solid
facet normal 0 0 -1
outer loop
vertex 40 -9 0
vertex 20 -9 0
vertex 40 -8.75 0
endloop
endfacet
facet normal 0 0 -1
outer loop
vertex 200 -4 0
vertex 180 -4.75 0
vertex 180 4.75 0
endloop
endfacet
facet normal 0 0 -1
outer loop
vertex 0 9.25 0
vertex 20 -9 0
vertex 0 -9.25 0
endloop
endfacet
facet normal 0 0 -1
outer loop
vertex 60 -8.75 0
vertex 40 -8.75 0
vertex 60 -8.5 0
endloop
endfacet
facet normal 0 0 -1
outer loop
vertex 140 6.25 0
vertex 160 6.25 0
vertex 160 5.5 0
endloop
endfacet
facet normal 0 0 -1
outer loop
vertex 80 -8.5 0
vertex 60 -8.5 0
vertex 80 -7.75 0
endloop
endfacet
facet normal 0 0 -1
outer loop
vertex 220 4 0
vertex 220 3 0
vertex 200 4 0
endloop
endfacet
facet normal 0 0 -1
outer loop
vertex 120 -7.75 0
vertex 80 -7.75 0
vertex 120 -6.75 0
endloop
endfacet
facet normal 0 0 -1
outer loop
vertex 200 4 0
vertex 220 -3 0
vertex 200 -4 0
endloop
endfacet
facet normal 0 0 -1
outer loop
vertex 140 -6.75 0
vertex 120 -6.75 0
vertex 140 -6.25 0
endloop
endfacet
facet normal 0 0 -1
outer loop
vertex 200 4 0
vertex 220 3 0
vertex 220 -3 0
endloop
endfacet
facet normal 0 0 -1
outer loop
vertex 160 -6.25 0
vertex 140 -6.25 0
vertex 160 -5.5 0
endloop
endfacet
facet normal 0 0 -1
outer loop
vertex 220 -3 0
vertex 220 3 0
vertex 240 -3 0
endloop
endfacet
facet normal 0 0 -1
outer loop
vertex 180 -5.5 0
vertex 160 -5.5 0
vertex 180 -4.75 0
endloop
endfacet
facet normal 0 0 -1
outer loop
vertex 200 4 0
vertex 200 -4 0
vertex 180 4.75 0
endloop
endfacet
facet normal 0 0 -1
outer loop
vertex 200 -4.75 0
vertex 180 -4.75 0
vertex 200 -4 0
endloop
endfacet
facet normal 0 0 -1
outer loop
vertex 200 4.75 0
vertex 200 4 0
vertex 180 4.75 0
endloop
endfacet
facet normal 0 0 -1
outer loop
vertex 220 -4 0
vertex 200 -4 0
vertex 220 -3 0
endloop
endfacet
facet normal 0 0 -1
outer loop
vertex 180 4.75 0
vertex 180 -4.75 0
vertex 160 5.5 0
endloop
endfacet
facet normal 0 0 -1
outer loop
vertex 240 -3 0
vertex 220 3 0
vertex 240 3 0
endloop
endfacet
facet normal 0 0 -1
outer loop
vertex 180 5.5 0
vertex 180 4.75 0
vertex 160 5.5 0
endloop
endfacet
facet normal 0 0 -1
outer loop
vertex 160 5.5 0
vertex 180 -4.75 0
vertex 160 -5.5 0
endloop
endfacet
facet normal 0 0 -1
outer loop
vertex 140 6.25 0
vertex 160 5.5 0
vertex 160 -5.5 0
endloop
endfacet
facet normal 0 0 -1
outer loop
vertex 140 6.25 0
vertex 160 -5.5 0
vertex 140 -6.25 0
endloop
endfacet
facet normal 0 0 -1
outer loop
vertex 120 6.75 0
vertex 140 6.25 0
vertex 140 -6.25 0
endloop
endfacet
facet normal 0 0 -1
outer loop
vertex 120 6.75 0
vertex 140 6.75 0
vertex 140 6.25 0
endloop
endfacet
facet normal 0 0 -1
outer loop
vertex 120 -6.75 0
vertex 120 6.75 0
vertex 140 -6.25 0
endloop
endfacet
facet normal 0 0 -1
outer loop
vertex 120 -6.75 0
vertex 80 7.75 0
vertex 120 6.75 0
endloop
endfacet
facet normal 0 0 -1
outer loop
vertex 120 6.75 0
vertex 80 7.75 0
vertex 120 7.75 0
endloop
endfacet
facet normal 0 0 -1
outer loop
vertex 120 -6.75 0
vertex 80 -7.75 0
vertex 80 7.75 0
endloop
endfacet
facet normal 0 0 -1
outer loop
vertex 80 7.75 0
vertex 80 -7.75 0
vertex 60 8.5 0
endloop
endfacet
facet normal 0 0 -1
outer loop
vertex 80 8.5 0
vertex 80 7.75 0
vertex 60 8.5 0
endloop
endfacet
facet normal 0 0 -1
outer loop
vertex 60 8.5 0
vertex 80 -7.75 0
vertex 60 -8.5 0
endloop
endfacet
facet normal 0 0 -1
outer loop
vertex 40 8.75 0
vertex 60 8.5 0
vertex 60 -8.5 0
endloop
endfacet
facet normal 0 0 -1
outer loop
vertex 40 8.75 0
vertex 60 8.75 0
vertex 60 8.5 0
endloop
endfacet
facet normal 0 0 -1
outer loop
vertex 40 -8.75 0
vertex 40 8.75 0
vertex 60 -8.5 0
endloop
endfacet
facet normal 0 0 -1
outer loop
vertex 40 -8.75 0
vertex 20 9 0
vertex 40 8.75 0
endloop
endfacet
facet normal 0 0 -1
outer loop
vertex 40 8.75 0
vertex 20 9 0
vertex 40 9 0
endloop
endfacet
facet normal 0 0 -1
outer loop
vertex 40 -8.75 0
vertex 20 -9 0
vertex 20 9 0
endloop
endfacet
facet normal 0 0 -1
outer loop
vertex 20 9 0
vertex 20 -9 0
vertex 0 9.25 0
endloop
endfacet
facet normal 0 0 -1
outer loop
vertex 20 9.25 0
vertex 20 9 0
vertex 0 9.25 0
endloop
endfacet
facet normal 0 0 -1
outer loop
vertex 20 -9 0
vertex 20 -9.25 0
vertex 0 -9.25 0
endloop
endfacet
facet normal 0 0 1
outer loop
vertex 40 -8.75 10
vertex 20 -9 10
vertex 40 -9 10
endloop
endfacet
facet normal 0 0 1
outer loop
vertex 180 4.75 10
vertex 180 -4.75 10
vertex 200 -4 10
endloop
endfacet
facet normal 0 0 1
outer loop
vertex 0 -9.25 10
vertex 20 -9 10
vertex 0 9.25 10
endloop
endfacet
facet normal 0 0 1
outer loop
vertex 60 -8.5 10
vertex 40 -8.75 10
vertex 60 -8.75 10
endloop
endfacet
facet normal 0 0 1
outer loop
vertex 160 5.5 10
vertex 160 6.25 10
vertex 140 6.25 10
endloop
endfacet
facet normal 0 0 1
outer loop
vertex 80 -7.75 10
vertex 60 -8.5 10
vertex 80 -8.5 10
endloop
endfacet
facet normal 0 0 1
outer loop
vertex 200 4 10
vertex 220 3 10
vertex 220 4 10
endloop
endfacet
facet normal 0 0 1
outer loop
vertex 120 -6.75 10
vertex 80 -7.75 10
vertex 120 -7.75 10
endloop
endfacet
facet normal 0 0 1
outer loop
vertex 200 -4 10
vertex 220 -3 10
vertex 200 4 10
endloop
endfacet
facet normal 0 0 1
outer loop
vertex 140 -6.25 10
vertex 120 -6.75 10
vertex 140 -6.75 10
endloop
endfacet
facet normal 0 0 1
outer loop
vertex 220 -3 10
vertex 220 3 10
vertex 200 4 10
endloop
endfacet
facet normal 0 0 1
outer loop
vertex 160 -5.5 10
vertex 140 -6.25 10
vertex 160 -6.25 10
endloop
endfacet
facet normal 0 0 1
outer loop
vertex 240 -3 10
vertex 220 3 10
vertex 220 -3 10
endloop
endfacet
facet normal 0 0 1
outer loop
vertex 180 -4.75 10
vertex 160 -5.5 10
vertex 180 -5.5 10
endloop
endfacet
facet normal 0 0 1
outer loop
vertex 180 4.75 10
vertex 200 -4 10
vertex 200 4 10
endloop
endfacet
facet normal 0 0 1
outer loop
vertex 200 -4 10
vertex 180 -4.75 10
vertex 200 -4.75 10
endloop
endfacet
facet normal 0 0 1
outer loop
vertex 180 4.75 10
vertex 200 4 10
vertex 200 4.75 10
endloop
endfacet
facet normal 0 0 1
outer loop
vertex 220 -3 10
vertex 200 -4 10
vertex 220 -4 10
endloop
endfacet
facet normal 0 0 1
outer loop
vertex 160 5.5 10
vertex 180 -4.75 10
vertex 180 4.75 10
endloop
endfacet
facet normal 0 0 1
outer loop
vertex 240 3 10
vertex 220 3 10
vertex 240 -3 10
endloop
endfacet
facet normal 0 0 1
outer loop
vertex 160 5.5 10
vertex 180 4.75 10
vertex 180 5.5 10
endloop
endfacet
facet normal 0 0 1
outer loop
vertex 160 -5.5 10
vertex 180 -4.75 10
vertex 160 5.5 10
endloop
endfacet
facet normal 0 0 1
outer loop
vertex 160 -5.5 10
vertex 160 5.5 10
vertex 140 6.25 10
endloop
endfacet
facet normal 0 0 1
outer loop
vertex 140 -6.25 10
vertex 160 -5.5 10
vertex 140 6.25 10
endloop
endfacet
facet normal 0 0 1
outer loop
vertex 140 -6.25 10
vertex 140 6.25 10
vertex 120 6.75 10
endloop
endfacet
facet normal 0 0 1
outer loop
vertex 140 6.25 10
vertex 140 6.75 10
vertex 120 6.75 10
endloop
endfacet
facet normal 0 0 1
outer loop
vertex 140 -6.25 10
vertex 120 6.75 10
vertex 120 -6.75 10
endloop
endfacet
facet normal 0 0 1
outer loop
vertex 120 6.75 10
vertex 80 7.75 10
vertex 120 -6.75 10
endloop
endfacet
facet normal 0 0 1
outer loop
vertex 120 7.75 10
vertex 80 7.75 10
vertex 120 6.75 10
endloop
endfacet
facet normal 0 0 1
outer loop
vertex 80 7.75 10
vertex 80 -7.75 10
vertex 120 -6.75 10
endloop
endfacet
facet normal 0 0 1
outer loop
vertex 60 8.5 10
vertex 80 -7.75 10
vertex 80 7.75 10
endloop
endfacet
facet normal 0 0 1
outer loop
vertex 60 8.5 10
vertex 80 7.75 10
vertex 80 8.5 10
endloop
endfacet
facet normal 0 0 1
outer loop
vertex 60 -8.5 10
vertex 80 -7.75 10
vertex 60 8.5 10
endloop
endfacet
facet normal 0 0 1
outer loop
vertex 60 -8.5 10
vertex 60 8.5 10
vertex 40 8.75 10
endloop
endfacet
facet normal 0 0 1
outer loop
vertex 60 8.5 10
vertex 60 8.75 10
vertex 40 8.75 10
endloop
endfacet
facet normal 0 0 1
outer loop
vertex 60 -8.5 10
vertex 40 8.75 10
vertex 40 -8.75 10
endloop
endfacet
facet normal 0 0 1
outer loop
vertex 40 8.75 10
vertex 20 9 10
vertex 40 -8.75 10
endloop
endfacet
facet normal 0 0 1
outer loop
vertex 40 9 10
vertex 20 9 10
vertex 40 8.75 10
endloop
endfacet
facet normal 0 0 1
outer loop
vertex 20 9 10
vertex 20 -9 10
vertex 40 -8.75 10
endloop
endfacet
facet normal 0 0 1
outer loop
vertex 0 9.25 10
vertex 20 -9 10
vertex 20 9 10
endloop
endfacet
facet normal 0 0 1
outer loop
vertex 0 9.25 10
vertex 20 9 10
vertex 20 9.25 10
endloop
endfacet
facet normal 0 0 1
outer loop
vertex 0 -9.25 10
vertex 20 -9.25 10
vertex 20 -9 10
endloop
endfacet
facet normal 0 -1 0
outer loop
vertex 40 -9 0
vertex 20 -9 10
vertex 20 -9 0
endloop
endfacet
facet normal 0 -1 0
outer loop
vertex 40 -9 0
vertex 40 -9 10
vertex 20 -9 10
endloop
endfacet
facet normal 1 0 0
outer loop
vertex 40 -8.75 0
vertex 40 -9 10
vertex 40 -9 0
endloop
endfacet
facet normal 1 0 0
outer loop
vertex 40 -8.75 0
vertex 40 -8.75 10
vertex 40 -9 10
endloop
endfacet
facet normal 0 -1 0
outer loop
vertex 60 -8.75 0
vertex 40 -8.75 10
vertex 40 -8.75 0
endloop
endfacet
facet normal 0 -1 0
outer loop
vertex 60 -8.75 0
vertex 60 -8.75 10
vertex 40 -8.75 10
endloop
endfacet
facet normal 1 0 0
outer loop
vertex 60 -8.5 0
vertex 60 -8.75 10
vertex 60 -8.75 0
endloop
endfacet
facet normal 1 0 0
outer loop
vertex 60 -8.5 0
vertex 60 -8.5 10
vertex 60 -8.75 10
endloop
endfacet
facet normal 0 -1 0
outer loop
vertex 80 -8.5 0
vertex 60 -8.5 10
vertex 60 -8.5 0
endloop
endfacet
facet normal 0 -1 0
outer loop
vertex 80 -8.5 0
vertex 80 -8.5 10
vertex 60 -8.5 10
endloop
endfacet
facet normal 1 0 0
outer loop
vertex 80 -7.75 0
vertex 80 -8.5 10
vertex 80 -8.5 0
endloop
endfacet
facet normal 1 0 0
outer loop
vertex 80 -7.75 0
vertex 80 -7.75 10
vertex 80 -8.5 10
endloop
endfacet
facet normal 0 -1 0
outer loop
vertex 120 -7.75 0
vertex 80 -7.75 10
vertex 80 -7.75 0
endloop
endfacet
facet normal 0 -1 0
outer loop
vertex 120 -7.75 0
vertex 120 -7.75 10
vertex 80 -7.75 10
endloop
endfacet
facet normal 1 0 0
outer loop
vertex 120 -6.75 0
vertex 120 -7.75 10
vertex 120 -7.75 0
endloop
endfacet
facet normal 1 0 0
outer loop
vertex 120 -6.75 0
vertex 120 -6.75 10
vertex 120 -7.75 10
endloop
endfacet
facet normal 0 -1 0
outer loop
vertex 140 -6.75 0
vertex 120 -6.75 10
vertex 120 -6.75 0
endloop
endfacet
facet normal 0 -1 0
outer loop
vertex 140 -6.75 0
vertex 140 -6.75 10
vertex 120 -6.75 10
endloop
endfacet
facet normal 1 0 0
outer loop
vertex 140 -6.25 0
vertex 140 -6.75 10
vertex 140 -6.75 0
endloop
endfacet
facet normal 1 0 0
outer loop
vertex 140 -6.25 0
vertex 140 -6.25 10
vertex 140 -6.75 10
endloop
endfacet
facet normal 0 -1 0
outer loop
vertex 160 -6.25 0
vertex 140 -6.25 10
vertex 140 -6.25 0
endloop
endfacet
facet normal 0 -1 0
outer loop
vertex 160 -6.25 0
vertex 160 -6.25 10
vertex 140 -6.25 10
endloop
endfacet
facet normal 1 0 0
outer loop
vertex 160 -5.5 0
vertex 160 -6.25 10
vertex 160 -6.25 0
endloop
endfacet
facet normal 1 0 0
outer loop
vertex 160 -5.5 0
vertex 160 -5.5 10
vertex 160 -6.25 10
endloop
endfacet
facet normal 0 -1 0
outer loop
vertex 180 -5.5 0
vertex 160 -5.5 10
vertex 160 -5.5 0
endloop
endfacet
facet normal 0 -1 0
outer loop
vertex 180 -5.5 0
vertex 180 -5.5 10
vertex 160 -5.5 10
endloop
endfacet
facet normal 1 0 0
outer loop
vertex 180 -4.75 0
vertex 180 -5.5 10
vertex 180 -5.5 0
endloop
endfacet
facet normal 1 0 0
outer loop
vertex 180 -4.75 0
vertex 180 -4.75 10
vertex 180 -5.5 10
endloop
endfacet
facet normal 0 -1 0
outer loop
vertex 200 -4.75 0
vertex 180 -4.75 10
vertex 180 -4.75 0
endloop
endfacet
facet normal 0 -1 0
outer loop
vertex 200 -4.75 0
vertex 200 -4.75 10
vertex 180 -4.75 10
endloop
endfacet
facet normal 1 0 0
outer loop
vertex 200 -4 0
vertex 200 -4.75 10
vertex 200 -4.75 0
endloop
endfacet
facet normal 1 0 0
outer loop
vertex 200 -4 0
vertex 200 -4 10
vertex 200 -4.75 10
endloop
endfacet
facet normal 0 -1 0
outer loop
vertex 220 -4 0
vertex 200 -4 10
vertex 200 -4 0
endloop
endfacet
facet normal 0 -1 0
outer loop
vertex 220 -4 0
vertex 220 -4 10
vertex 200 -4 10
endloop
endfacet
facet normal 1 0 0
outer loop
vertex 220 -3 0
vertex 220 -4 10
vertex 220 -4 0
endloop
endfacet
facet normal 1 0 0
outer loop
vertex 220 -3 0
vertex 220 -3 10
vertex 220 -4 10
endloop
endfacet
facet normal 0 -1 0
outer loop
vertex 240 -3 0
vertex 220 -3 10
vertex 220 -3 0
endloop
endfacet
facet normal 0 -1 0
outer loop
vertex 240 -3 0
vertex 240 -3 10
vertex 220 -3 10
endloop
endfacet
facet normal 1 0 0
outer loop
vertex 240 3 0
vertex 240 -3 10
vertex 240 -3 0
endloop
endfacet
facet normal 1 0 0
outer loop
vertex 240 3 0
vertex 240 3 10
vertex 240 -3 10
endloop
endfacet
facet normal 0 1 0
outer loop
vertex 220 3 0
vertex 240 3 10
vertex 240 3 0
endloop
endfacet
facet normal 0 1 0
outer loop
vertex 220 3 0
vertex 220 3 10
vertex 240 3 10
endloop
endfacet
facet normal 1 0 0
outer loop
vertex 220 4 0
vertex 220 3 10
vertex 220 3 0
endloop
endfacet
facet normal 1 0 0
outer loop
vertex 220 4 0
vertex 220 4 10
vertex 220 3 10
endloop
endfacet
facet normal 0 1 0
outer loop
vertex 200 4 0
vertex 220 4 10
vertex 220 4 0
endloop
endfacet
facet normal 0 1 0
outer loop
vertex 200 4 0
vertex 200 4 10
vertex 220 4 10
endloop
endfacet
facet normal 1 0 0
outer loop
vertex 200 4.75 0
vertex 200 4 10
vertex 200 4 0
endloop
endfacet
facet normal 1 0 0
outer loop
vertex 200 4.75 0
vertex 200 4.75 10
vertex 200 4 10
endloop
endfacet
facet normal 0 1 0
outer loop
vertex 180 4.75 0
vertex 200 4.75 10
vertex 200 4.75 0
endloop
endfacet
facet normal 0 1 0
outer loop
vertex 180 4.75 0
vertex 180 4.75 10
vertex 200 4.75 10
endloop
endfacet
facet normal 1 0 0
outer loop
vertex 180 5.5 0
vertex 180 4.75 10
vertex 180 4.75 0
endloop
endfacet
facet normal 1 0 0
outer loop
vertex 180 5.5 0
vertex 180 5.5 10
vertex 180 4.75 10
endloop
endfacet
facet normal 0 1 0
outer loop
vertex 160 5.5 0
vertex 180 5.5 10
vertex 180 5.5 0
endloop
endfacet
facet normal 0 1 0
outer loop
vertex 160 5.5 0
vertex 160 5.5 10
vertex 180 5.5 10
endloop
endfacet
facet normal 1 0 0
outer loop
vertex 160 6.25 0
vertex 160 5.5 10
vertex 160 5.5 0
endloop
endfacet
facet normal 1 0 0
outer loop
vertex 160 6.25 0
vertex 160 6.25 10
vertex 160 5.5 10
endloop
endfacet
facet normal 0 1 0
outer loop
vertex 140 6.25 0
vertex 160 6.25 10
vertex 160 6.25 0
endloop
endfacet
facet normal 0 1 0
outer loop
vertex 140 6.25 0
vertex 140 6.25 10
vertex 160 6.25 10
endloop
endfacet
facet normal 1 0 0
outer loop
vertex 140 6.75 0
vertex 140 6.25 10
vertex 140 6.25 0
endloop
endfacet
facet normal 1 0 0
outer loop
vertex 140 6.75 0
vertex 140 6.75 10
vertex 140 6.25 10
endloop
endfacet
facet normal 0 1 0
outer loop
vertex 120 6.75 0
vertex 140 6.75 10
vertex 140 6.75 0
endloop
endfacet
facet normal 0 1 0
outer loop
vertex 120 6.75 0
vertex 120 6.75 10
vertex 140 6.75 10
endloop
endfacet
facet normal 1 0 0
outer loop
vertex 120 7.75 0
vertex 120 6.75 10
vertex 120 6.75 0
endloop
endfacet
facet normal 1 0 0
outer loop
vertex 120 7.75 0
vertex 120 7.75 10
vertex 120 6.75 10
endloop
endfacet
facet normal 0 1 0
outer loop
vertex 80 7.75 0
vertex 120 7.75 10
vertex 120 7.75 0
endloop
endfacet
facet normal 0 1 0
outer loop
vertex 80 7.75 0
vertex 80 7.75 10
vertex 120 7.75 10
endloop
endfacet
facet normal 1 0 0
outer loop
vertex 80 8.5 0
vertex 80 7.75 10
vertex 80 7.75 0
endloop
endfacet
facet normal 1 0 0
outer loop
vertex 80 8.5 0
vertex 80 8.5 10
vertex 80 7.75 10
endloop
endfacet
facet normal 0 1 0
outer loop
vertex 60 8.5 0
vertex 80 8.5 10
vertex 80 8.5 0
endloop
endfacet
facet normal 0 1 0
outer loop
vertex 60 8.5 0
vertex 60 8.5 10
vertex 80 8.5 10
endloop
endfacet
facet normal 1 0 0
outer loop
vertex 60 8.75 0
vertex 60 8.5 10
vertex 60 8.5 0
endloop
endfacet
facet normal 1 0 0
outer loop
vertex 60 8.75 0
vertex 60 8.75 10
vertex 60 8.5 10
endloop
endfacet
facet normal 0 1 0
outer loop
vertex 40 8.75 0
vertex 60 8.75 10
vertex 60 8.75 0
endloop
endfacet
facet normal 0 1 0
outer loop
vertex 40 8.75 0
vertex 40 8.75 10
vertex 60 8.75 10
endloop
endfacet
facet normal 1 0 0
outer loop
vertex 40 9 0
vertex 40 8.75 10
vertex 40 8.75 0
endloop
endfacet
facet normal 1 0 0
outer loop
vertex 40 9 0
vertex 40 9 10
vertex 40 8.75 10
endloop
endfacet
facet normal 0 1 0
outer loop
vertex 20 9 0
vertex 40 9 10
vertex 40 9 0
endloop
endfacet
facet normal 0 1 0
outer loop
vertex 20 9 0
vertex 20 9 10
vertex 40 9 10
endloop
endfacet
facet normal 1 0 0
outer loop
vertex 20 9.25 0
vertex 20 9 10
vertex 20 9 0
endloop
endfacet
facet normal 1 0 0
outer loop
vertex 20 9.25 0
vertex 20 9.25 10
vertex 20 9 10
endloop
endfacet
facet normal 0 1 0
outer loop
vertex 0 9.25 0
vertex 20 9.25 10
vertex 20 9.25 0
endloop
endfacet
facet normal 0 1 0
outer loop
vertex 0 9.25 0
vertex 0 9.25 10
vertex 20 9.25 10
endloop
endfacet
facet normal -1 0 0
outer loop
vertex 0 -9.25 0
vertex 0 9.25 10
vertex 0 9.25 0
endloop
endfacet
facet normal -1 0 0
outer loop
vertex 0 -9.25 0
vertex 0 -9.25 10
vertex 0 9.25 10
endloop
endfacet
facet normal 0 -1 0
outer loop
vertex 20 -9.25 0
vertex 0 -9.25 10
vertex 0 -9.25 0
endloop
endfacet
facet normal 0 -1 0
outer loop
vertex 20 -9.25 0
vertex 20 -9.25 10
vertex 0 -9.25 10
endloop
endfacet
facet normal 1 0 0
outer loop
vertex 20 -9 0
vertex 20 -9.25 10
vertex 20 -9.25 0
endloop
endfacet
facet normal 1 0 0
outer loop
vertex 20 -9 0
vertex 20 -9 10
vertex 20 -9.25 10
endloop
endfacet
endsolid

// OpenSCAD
// Units: mm. Beam-model study only; physical/manufacturing validation pending.
linear_extrude(height=10)
polygon(points=[[0,-9.25],[20.0,-9.25],[20.0,-9.0],[40.0,-9.0],[40.0,-8.75],[60.0,-8.75],[60.0,-8.5],[80.0,-8.5],[80.0,-7.75],[100.0,-7.75],[120.0,-7.75],[120.0,-6.75],[140.0,-6.75],[140.0,-6.25],[160.0,-6.25],[160.0,-5.5],[180.0,-5.5],[180.0,-4.75],[200.0,-4.75],[200.0,-4.0],[220.0,-4.0],[220.0,-3.0],[240.0,-3.0],[240,3.0],[220.0,3.0],[220.0,4.0],[200.0,4.0],[200.0,4.75],[180.0,4.75],[180.0,5.5],[160.0,5.5],[160.0,6.25],[140.0,6.25],[140.0,6.75],[120.0,6.75],[120.0,7.75],[100.0,7.75],[80.0,7.75],[80.0,8.5],[60.0,8.5],[60.0,8.75],[40.0,8.75],[40.0,9.0],[20.0,9.0],[20.0,9.25],[0.0,9.25]]);
